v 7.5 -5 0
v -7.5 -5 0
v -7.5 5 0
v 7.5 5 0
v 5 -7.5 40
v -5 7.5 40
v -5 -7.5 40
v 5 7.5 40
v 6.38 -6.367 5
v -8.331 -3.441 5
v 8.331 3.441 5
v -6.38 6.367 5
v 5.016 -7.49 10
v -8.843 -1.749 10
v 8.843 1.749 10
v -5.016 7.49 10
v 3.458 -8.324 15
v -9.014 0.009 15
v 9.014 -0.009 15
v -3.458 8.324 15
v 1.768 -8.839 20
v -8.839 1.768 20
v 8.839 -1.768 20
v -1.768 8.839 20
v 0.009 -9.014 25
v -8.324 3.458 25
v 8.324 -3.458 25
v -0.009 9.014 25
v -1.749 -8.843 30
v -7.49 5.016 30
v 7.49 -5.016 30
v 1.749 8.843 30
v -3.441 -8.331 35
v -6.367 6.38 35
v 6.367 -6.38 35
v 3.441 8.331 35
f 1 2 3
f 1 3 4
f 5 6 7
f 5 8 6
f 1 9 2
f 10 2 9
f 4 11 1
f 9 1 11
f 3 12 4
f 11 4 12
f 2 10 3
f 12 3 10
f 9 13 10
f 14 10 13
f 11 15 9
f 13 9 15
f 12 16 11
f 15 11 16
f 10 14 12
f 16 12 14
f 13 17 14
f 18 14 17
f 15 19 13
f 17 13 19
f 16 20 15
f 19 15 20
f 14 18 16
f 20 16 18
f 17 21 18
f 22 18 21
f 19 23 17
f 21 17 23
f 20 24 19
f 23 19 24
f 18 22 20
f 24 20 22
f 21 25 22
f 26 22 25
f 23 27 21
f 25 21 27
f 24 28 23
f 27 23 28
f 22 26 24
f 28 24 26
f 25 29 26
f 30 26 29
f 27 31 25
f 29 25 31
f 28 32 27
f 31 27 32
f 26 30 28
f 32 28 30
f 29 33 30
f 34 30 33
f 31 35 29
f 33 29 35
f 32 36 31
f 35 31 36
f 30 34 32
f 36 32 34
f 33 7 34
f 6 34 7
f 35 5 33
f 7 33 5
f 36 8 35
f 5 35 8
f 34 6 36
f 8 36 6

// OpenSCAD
//!OpenSCAD

height = 40;
scale_X = 1;
scale_Y = 1;
twist_angle = 90;
Base_square_X = 15;
Base_square_Y = 10;
color([0.2,0.2,1]) {
  linear_extrude( height=height, twist=twist_angle, scale=[scale_X, scale_Y], center=false){
    square([Base_square_X, Base_square_Y], center=true);
  }
}
